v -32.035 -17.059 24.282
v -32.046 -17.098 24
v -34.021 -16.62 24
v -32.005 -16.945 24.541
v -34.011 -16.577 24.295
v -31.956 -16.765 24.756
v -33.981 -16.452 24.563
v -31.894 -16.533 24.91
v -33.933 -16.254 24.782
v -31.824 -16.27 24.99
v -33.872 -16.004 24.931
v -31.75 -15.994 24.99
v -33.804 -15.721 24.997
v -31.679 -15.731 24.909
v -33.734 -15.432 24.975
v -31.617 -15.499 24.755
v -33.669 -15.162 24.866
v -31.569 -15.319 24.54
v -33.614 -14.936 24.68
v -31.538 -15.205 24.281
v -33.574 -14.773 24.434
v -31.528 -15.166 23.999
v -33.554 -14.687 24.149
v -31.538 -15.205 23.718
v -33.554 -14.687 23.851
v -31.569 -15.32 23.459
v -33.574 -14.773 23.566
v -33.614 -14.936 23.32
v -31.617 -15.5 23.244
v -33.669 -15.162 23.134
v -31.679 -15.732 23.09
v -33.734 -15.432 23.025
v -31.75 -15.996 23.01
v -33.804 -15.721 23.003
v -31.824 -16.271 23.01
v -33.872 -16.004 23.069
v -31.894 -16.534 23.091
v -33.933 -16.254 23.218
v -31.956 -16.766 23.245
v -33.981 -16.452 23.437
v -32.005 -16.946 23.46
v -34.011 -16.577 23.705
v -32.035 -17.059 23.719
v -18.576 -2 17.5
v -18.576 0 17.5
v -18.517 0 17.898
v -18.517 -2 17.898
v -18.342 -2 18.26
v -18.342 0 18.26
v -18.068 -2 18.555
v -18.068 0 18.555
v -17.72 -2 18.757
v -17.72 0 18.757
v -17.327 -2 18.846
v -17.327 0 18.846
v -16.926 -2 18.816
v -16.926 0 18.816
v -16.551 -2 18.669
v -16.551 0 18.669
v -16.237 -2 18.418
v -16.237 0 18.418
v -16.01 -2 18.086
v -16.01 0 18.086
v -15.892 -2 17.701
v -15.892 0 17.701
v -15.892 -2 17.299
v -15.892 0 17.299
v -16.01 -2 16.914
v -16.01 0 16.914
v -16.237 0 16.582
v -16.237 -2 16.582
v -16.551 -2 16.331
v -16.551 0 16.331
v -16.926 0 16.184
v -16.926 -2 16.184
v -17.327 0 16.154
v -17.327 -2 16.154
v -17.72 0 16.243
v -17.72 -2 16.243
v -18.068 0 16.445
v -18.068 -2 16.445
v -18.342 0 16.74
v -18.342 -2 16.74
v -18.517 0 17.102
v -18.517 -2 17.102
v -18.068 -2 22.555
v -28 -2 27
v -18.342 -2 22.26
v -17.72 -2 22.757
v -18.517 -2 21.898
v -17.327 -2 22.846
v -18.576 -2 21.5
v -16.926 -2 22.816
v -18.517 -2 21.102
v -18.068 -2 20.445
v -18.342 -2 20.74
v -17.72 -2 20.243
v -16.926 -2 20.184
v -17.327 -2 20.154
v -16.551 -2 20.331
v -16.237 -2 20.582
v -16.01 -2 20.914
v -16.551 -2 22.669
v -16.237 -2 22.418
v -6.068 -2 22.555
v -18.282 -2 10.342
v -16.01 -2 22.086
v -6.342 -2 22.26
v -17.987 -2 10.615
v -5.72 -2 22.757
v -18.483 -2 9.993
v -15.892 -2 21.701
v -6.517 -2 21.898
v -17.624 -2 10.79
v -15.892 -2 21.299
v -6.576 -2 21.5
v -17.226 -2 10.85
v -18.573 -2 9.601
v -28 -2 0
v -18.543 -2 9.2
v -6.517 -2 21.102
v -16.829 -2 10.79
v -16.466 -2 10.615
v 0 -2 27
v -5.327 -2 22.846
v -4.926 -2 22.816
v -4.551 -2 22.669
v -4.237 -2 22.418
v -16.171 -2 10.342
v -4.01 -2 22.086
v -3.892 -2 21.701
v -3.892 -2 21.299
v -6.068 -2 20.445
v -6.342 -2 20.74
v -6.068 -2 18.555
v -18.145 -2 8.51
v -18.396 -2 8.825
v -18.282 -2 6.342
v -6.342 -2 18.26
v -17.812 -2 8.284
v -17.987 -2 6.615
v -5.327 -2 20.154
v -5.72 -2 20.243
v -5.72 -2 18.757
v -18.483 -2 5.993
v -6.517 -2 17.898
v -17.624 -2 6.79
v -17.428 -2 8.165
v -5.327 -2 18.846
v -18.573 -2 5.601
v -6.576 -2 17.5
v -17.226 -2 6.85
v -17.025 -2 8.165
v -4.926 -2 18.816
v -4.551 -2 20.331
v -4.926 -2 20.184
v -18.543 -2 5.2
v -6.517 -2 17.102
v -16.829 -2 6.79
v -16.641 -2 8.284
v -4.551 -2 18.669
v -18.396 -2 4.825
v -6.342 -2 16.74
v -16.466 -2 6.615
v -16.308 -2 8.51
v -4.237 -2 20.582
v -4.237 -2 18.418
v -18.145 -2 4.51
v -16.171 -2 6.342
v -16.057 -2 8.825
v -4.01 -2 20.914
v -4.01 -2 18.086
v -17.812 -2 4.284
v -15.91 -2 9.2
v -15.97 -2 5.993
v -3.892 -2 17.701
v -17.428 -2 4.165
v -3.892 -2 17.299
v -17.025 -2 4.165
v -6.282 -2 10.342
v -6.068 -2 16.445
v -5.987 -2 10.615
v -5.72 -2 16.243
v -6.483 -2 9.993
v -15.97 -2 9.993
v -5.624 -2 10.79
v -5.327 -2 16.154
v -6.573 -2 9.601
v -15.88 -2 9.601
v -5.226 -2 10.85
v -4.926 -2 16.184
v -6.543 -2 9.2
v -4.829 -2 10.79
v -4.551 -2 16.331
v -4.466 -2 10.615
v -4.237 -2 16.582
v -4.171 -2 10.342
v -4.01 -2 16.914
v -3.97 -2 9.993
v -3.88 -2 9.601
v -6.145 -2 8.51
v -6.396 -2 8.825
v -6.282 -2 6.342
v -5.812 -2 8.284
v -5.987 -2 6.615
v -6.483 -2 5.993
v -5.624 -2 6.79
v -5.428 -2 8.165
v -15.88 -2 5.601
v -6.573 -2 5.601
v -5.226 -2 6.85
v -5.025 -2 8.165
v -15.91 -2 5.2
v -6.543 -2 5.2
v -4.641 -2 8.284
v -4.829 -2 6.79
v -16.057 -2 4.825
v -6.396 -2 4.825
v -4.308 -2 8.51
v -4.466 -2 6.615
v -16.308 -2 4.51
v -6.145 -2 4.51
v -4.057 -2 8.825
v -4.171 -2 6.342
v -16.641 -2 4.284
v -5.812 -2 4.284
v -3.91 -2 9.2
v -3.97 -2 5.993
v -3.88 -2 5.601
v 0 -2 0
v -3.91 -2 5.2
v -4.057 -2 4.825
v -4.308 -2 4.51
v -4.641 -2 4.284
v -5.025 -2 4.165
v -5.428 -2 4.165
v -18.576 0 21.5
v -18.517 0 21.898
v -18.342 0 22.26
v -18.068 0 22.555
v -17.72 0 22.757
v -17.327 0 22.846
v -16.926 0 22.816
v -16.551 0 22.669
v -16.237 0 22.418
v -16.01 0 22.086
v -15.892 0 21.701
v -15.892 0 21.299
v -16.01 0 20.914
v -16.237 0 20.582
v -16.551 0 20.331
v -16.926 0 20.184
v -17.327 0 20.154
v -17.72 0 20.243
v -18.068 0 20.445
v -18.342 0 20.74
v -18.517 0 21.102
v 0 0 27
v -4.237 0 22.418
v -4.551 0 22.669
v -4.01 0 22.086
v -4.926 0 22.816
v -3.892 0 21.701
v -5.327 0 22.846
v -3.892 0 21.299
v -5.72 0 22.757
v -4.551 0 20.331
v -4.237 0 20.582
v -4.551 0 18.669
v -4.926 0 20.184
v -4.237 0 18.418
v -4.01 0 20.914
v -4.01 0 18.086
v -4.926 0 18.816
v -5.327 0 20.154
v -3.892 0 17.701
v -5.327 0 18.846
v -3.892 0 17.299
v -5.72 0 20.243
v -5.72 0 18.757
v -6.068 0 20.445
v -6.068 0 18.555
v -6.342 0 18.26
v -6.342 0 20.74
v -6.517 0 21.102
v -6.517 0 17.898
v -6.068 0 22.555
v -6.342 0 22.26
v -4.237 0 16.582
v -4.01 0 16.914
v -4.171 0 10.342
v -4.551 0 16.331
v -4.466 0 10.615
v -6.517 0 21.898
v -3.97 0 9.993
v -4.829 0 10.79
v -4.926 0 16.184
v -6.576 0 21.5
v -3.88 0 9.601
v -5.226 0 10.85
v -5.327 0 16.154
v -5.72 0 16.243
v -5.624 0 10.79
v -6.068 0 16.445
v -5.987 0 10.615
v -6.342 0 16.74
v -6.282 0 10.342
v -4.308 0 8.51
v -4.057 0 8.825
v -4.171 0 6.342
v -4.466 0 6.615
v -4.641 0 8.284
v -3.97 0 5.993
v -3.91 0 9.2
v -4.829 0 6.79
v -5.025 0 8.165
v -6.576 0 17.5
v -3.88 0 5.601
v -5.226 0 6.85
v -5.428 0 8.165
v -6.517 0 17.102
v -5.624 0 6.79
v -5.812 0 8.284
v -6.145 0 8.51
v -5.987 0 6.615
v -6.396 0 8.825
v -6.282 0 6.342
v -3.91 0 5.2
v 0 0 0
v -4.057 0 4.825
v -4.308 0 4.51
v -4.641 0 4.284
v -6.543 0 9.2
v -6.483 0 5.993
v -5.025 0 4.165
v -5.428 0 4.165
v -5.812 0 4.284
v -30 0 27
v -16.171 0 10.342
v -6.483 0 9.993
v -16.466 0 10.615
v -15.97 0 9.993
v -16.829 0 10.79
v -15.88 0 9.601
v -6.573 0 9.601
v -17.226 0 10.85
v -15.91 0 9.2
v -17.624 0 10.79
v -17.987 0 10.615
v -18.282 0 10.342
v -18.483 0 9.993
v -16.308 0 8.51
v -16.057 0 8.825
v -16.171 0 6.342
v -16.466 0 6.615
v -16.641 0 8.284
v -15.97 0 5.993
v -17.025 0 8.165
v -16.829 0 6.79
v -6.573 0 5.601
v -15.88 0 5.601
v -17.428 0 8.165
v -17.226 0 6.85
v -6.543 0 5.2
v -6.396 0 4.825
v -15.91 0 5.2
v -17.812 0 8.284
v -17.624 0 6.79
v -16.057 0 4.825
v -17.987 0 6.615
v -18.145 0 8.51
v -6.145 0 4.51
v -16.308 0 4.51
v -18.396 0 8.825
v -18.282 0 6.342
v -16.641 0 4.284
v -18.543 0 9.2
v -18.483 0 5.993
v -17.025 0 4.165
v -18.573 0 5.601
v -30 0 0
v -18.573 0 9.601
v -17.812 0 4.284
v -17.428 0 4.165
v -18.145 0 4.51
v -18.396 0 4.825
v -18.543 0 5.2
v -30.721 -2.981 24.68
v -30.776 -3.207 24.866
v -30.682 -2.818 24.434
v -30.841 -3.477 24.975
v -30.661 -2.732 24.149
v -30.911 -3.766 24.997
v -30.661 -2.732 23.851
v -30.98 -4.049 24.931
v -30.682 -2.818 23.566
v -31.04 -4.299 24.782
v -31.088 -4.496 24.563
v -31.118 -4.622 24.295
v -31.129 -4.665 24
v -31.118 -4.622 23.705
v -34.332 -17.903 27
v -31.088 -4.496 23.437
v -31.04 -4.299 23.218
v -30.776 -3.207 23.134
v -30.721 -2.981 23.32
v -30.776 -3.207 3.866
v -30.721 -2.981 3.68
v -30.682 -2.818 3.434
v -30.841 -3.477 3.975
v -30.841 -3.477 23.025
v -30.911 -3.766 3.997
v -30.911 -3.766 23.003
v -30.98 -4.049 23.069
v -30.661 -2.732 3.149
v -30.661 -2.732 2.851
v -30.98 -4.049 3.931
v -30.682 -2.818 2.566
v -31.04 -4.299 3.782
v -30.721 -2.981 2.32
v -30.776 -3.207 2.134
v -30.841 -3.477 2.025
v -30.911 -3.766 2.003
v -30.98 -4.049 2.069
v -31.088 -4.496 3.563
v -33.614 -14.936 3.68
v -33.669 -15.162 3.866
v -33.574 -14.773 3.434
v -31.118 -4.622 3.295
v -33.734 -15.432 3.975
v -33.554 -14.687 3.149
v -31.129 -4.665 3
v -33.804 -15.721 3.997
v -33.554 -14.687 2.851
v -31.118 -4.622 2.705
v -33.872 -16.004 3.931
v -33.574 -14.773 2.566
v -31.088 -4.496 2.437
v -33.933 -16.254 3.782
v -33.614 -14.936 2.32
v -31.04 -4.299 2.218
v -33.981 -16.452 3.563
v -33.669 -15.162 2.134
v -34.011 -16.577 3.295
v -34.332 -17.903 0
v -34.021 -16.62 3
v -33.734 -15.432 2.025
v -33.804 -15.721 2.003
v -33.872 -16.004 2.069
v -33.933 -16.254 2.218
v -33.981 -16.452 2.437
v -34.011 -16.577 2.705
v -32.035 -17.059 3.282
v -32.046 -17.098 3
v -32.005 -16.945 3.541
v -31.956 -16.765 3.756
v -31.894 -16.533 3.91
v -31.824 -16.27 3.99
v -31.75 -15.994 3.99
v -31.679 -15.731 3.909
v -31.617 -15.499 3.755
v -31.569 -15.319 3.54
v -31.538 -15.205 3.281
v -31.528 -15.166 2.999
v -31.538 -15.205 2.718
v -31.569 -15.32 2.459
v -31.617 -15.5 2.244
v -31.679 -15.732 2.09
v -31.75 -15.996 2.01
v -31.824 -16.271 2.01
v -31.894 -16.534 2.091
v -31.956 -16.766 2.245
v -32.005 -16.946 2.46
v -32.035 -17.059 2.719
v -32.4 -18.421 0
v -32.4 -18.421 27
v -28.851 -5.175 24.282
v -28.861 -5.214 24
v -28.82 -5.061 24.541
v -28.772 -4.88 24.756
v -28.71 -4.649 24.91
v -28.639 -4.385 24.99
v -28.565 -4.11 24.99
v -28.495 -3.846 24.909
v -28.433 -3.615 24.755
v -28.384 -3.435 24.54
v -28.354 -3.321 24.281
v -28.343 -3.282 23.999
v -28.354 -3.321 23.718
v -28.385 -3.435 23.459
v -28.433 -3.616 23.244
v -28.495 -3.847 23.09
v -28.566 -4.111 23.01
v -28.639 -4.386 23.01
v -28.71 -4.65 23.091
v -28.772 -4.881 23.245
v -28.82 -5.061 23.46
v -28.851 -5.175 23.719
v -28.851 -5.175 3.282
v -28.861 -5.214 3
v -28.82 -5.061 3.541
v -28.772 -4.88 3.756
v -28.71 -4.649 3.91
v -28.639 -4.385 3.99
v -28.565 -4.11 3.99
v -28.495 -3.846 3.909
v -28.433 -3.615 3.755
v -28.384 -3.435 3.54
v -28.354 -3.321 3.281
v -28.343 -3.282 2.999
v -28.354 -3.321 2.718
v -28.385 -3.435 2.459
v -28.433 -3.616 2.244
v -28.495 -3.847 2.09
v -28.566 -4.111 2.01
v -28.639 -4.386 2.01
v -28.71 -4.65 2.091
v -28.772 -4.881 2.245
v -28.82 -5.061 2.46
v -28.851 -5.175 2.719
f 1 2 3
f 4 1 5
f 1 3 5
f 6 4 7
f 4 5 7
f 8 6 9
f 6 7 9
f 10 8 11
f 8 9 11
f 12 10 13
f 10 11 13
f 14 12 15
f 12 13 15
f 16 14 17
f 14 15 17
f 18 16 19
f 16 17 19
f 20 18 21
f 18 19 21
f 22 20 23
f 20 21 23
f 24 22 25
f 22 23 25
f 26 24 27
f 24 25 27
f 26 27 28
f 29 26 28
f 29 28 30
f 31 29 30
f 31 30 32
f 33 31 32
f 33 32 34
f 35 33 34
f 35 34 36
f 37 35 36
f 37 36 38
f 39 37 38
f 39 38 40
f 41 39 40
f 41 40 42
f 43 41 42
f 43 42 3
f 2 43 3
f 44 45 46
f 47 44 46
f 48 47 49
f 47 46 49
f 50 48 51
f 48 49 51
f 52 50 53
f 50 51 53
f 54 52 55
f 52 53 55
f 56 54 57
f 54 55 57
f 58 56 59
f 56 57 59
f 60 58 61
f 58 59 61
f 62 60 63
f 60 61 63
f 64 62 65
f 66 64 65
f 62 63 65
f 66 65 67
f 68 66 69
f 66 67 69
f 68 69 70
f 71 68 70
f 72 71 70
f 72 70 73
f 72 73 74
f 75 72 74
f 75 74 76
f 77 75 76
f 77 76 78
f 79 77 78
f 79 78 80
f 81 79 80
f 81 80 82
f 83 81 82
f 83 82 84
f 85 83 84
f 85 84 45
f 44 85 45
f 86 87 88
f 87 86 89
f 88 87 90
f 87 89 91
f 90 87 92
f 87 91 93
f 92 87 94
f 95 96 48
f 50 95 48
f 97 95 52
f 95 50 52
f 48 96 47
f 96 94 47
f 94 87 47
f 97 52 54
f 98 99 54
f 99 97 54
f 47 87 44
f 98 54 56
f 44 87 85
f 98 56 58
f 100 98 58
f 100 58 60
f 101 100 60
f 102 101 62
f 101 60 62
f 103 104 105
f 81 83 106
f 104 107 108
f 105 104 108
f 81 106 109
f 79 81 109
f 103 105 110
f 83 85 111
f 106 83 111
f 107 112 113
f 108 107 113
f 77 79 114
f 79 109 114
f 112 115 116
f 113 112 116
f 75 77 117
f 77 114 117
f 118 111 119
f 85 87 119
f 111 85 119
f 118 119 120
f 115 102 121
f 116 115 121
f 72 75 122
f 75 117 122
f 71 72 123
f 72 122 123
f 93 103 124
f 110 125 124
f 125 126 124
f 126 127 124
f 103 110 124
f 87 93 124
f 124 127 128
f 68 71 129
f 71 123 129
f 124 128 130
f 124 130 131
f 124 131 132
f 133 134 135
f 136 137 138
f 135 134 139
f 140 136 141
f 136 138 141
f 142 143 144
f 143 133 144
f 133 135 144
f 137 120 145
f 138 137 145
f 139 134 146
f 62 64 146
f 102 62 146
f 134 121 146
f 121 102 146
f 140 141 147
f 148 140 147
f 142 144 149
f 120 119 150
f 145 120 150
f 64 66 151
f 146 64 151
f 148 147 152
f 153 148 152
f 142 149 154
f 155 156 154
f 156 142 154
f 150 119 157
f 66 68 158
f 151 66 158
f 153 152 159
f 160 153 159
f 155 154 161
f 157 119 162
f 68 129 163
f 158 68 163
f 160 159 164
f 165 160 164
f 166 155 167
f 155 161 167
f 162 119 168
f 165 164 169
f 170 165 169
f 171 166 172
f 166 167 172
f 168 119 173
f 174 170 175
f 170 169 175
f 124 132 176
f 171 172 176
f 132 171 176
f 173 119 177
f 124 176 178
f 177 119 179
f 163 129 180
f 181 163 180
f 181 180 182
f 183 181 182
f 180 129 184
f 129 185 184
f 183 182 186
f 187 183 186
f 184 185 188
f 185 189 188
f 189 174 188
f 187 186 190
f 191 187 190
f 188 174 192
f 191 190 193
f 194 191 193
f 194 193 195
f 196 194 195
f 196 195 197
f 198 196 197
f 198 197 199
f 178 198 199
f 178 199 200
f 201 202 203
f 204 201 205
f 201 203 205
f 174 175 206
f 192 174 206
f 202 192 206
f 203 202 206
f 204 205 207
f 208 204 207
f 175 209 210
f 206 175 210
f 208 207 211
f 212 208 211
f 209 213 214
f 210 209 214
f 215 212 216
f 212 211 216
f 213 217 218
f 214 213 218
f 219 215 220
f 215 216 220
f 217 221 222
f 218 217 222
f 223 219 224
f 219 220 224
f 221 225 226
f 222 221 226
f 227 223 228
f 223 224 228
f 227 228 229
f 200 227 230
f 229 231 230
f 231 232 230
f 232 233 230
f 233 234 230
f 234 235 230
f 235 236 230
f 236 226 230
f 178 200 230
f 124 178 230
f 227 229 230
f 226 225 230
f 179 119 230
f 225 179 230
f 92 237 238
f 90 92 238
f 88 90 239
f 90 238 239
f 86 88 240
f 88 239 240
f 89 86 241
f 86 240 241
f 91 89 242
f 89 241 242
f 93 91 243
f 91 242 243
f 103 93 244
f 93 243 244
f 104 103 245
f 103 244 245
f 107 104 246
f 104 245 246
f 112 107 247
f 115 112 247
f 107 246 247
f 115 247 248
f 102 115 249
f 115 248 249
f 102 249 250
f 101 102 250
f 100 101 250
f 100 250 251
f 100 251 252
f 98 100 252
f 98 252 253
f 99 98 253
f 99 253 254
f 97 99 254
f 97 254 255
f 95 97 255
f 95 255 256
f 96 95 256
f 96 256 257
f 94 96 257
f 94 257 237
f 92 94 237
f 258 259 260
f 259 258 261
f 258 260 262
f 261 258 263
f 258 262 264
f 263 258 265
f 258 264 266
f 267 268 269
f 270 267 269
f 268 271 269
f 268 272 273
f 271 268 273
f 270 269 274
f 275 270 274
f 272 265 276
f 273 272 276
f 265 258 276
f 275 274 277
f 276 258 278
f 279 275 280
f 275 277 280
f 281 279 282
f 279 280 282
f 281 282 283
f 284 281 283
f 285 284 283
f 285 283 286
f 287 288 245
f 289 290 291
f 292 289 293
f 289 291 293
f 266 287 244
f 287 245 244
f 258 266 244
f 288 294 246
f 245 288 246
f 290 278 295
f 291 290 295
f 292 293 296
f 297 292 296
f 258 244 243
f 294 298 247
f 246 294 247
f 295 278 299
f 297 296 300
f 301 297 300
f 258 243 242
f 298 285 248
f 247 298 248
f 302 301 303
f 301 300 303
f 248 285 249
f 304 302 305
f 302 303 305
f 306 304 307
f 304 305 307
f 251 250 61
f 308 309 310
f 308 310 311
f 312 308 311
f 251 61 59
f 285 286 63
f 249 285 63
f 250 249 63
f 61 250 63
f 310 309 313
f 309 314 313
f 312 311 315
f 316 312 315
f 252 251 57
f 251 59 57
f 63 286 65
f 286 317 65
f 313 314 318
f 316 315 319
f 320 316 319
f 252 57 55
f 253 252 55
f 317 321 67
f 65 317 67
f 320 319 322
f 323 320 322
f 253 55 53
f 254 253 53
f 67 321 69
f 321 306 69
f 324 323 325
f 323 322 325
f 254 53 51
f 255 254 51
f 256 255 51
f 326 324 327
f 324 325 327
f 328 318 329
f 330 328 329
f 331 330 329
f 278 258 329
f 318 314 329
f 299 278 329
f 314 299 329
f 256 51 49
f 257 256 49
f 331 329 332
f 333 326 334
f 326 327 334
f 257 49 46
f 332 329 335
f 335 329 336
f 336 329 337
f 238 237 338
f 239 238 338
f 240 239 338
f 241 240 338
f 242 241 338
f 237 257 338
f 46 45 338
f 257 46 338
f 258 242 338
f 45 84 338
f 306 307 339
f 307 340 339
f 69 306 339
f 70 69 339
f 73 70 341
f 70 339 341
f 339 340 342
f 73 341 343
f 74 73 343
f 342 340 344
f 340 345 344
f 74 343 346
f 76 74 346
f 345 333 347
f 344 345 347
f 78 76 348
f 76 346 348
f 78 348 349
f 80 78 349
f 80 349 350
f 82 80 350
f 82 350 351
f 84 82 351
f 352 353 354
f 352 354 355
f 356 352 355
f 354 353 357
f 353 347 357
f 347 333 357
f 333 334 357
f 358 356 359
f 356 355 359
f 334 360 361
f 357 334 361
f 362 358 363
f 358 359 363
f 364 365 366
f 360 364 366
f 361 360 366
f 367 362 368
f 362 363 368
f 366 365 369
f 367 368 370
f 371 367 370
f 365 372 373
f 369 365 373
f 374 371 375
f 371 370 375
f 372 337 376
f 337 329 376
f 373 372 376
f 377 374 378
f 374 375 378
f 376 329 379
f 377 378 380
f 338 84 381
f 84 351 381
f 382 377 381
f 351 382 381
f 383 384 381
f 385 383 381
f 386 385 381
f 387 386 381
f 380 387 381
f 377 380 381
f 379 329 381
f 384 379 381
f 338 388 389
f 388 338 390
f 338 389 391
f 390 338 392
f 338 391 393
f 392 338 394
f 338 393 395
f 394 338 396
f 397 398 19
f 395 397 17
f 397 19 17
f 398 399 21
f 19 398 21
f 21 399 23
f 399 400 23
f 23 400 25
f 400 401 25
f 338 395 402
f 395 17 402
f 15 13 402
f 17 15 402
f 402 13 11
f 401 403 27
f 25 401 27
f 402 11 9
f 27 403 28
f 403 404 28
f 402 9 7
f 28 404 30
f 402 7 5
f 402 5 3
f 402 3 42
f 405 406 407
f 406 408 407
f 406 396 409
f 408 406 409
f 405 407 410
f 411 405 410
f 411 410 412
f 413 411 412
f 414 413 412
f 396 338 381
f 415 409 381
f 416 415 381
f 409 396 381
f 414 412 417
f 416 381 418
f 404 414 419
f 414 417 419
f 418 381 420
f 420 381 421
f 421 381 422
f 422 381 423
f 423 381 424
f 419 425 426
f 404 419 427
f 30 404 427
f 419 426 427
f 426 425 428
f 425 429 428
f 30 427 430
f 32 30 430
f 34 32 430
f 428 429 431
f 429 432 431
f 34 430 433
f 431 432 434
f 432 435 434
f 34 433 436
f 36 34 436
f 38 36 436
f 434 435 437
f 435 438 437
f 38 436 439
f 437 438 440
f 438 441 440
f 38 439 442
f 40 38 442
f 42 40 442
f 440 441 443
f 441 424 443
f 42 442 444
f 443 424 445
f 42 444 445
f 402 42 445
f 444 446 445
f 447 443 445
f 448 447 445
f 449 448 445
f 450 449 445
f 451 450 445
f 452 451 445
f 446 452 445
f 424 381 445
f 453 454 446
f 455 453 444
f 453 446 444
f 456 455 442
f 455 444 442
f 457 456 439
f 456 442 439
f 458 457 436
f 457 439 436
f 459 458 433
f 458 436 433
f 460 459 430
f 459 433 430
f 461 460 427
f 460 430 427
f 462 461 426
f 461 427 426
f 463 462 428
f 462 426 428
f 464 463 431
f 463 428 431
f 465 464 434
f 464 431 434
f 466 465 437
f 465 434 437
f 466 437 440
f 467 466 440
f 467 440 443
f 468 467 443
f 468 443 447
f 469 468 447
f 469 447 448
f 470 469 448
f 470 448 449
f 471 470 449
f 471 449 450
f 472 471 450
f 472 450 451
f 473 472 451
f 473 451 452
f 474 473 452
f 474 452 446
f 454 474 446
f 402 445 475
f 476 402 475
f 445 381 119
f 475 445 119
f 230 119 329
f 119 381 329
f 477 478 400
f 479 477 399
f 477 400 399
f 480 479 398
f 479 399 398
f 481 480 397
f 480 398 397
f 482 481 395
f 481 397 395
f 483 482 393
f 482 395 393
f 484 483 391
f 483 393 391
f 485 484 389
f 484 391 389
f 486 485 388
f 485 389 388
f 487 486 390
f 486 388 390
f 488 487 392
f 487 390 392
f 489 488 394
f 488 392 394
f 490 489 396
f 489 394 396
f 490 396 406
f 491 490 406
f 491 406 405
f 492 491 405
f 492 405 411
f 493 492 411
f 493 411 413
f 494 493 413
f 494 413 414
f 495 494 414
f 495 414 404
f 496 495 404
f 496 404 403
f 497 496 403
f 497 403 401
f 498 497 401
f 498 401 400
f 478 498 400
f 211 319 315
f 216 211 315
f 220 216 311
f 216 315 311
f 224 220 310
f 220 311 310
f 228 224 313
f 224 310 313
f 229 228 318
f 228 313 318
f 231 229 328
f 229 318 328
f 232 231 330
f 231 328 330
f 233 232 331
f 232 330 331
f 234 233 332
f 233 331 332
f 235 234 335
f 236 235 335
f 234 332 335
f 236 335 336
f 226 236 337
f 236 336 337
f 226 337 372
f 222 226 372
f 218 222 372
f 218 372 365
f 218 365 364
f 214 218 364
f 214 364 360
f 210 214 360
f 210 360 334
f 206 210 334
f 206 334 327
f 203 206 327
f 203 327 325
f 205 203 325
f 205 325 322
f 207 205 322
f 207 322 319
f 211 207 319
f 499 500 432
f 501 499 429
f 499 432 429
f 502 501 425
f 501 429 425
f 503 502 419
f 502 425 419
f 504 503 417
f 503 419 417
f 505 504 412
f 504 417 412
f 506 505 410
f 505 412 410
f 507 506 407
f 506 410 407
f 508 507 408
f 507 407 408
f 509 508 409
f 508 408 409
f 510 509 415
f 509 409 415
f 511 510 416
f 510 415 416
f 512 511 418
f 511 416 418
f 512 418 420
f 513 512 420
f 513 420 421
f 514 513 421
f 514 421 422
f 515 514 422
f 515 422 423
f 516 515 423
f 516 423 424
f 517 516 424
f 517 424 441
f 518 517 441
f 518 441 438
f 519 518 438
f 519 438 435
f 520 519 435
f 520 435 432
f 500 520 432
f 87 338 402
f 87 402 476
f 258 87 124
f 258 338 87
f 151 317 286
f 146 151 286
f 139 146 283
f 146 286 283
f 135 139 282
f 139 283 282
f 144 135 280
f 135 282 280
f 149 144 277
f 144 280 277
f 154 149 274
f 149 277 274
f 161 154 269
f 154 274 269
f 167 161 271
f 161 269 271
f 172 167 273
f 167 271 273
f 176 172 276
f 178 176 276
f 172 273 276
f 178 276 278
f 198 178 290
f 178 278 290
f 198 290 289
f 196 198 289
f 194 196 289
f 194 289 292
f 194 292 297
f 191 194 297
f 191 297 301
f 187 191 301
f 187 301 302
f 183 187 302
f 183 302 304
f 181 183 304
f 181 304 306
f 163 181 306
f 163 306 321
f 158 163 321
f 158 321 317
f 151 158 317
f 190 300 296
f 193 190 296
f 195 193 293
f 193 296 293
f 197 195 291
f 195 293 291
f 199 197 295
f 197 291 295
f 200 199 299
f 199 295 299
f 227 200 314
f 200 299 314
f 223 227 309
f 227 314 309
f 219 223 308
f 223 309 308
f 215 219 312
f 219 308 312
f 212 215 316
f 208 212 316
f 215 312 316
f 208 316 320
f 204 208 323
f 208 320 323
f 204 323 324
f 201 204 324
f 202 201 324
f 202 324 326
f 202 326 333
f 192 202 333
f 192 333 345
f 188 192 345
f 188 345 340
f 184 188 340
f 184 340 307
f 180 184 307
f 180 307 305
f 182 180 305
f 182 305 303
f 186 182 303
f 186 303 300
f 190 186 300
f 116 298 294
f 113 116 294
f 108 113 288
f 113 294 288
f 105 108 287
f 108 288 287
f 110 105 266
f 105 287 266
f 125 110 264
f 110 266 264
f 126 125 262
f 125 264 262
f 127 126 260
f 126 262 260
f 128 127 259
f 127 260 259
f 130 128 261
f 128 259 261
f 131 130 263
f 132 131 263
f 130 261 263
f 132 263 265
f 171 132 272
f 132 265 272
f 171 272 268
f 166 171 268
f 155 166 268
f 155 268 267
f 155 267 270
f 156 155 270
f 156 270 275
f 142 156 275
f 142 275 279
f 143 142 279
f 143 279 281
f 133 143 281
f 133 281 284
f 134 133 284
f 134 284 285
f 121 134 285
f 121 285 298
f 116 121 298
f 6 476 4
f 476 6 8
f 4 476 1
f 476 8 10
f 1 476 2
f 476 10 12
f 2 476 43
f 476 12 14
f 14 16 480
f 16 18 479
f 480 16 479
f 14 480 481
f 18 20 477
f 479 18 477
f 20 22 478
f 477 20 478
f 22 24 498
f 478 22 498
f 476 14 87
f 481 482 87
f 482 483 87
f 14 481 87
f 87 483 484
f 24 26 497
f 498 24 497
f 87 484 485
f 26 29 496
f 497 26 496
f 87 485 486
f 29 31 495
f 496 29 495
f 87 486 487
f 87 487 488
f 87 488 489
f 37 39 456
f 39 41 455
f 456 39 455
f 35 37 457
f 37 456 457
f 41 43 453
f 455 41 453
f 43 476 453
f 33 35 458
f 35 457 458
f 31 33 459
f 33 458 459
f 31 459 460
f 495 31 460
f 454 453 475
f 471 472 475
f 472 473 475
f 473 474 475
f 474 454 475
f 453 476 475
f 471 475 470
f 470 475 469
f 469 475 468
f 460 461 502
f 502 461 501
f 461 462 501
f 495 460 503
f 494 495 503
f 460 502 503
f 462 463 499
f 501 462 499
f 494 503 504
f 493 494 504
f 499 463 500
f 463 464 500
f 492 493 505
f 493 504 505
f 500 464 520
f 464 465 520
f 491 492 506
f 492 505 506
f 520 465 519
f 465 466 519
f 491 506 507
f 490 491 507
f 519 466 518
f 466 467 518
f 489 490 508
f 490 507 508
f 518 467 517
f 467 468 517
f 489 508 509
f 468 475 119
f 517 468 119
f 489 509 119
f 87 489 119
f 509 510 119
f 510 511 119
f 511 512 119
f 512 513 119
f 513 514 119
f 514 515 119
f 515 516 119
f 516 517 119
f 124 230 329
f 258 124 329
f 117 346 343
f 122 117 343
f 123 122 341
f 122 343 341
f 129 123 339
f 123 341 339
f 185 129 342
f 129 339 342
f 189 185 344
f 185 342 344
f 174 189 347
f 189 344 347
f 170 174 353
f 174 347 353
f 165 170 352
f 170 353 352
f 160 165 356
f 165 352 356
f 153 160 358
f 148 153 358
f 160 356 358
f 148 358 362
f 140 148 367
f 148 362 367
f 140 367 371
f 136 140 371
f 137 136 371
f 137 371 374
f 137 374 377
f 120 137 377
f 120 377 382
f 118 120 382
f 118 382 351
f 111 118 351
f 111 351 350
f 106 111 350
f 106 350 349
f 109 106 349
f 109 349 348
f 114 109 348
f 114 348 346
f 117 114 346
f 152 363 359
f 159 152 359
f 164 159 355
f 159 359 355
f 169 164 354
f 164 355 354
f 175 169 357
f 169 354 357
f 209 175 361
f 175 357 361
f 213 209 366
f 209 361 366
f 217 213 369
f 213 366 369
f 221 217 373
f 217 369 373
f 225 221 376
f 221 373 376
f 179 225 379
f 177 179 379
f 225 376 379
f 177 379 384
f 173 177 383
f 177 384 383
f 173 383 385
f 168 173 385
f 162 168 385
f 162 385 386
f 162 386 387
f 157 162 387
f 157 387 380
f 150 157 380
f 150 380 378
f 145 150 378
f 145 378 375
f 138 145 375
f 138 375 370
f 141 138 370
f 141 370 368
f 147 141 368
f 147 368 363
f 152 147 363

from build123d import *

# Parameters (mm, degrees)
BOSS_EXTRUDE3_DEPTH = 27
SKETCH7_R           = 1.35
CUT_EXTRUDE2_DEPTH  = 20
SKETCH8_R           = 1
CUT_EXTRUDE3_DEPTH  = 20


with BuildPart() as part:
    # Sketch5 → Boss-Extrude3 (new body)
    with BuildSketch(Plane.XY):
        Polygon((0, 0), (-30, 0), (-34.331775419, -17.903100957), (-32.399923767, -18.420739047), (-28, -2), (0, -2), align=None)
    extrude(amount=BOSS_EXTRUDE3_DEPTH)

    # Sketch7 → Cut-Extrude2 (cut)
    with BuildSketch(Plane(origin=(0, 0, 0), x_dir=(1, 0, 0), z_dir=(0, 1, 0))):
        with Locations(Location((-17.22649731, -5.5, 0), (0, 0, 270))):
            Circle(SKETCH7_R)
        with Locations(Location((-17.22649731, -9.5, 0), (0, 0, 270))):
            Circle(SKETCH7_R)
        with Locations(Location((-5.22649731, -5.5, 0), (0, 0, 270))):
            Circle(SKETCH7_R)
        with Locations(Location((-5.22649731, -9.5, 0), (0, 0, 270))):
            Circle(SKETCH7_R)
        with Locations(Location((-5.22649731, -17.5, 0), (0, 0, 180))):
            Circle(SKETCH7_R)
        with Locations(Location((-5.22649731, -21.5, 0), (0, 0, 180))):
            Circle(SKETCH7_R)
        with Locations(Location((-17.22649731, -17.5, 0), (0, 0, 180))):
            Circle(SKETCH7_R)
        with Locations(Location((-17.22649731, -21.5, 0), (0, 0, 180))):
            Circle(SKETCH7_R)
    extrude(amount=-CUT_EXTRUDE2_DEPTH, mode=Mode.SUBTRACT)

    # Sketch8 → Cut-Extrude3 (cut)
    with BuildSketch(Plane(origin=(-28.340840747, 6.857256606, 0), x_dir=(0, 0, 1), z_dir=(-0.9719540583604048, 0.23517080693984682, 0))):
        with Locations(Location((3, -10.855124208, 0), (0, 0, 270))):
            Circle(SKETCH8_R)
        with Locations(Location((3, -23.155124208, 0), (0, 0, 270))):
            Circle(SKETCH8_R)
        with Locations(Location((24, -23.155124208, 0), (0, 0, 270))):
            Circle(SKETCH8_R)
        with Locations(Location((24, -10.855124208, 0), (0, 0, 270))):
            Circle(SKETCH8_R)
    extrude(amount=-CUT_EXTRUDE3_DEPTH, mode=Mode.SUBTRACT)


solid = part.part
